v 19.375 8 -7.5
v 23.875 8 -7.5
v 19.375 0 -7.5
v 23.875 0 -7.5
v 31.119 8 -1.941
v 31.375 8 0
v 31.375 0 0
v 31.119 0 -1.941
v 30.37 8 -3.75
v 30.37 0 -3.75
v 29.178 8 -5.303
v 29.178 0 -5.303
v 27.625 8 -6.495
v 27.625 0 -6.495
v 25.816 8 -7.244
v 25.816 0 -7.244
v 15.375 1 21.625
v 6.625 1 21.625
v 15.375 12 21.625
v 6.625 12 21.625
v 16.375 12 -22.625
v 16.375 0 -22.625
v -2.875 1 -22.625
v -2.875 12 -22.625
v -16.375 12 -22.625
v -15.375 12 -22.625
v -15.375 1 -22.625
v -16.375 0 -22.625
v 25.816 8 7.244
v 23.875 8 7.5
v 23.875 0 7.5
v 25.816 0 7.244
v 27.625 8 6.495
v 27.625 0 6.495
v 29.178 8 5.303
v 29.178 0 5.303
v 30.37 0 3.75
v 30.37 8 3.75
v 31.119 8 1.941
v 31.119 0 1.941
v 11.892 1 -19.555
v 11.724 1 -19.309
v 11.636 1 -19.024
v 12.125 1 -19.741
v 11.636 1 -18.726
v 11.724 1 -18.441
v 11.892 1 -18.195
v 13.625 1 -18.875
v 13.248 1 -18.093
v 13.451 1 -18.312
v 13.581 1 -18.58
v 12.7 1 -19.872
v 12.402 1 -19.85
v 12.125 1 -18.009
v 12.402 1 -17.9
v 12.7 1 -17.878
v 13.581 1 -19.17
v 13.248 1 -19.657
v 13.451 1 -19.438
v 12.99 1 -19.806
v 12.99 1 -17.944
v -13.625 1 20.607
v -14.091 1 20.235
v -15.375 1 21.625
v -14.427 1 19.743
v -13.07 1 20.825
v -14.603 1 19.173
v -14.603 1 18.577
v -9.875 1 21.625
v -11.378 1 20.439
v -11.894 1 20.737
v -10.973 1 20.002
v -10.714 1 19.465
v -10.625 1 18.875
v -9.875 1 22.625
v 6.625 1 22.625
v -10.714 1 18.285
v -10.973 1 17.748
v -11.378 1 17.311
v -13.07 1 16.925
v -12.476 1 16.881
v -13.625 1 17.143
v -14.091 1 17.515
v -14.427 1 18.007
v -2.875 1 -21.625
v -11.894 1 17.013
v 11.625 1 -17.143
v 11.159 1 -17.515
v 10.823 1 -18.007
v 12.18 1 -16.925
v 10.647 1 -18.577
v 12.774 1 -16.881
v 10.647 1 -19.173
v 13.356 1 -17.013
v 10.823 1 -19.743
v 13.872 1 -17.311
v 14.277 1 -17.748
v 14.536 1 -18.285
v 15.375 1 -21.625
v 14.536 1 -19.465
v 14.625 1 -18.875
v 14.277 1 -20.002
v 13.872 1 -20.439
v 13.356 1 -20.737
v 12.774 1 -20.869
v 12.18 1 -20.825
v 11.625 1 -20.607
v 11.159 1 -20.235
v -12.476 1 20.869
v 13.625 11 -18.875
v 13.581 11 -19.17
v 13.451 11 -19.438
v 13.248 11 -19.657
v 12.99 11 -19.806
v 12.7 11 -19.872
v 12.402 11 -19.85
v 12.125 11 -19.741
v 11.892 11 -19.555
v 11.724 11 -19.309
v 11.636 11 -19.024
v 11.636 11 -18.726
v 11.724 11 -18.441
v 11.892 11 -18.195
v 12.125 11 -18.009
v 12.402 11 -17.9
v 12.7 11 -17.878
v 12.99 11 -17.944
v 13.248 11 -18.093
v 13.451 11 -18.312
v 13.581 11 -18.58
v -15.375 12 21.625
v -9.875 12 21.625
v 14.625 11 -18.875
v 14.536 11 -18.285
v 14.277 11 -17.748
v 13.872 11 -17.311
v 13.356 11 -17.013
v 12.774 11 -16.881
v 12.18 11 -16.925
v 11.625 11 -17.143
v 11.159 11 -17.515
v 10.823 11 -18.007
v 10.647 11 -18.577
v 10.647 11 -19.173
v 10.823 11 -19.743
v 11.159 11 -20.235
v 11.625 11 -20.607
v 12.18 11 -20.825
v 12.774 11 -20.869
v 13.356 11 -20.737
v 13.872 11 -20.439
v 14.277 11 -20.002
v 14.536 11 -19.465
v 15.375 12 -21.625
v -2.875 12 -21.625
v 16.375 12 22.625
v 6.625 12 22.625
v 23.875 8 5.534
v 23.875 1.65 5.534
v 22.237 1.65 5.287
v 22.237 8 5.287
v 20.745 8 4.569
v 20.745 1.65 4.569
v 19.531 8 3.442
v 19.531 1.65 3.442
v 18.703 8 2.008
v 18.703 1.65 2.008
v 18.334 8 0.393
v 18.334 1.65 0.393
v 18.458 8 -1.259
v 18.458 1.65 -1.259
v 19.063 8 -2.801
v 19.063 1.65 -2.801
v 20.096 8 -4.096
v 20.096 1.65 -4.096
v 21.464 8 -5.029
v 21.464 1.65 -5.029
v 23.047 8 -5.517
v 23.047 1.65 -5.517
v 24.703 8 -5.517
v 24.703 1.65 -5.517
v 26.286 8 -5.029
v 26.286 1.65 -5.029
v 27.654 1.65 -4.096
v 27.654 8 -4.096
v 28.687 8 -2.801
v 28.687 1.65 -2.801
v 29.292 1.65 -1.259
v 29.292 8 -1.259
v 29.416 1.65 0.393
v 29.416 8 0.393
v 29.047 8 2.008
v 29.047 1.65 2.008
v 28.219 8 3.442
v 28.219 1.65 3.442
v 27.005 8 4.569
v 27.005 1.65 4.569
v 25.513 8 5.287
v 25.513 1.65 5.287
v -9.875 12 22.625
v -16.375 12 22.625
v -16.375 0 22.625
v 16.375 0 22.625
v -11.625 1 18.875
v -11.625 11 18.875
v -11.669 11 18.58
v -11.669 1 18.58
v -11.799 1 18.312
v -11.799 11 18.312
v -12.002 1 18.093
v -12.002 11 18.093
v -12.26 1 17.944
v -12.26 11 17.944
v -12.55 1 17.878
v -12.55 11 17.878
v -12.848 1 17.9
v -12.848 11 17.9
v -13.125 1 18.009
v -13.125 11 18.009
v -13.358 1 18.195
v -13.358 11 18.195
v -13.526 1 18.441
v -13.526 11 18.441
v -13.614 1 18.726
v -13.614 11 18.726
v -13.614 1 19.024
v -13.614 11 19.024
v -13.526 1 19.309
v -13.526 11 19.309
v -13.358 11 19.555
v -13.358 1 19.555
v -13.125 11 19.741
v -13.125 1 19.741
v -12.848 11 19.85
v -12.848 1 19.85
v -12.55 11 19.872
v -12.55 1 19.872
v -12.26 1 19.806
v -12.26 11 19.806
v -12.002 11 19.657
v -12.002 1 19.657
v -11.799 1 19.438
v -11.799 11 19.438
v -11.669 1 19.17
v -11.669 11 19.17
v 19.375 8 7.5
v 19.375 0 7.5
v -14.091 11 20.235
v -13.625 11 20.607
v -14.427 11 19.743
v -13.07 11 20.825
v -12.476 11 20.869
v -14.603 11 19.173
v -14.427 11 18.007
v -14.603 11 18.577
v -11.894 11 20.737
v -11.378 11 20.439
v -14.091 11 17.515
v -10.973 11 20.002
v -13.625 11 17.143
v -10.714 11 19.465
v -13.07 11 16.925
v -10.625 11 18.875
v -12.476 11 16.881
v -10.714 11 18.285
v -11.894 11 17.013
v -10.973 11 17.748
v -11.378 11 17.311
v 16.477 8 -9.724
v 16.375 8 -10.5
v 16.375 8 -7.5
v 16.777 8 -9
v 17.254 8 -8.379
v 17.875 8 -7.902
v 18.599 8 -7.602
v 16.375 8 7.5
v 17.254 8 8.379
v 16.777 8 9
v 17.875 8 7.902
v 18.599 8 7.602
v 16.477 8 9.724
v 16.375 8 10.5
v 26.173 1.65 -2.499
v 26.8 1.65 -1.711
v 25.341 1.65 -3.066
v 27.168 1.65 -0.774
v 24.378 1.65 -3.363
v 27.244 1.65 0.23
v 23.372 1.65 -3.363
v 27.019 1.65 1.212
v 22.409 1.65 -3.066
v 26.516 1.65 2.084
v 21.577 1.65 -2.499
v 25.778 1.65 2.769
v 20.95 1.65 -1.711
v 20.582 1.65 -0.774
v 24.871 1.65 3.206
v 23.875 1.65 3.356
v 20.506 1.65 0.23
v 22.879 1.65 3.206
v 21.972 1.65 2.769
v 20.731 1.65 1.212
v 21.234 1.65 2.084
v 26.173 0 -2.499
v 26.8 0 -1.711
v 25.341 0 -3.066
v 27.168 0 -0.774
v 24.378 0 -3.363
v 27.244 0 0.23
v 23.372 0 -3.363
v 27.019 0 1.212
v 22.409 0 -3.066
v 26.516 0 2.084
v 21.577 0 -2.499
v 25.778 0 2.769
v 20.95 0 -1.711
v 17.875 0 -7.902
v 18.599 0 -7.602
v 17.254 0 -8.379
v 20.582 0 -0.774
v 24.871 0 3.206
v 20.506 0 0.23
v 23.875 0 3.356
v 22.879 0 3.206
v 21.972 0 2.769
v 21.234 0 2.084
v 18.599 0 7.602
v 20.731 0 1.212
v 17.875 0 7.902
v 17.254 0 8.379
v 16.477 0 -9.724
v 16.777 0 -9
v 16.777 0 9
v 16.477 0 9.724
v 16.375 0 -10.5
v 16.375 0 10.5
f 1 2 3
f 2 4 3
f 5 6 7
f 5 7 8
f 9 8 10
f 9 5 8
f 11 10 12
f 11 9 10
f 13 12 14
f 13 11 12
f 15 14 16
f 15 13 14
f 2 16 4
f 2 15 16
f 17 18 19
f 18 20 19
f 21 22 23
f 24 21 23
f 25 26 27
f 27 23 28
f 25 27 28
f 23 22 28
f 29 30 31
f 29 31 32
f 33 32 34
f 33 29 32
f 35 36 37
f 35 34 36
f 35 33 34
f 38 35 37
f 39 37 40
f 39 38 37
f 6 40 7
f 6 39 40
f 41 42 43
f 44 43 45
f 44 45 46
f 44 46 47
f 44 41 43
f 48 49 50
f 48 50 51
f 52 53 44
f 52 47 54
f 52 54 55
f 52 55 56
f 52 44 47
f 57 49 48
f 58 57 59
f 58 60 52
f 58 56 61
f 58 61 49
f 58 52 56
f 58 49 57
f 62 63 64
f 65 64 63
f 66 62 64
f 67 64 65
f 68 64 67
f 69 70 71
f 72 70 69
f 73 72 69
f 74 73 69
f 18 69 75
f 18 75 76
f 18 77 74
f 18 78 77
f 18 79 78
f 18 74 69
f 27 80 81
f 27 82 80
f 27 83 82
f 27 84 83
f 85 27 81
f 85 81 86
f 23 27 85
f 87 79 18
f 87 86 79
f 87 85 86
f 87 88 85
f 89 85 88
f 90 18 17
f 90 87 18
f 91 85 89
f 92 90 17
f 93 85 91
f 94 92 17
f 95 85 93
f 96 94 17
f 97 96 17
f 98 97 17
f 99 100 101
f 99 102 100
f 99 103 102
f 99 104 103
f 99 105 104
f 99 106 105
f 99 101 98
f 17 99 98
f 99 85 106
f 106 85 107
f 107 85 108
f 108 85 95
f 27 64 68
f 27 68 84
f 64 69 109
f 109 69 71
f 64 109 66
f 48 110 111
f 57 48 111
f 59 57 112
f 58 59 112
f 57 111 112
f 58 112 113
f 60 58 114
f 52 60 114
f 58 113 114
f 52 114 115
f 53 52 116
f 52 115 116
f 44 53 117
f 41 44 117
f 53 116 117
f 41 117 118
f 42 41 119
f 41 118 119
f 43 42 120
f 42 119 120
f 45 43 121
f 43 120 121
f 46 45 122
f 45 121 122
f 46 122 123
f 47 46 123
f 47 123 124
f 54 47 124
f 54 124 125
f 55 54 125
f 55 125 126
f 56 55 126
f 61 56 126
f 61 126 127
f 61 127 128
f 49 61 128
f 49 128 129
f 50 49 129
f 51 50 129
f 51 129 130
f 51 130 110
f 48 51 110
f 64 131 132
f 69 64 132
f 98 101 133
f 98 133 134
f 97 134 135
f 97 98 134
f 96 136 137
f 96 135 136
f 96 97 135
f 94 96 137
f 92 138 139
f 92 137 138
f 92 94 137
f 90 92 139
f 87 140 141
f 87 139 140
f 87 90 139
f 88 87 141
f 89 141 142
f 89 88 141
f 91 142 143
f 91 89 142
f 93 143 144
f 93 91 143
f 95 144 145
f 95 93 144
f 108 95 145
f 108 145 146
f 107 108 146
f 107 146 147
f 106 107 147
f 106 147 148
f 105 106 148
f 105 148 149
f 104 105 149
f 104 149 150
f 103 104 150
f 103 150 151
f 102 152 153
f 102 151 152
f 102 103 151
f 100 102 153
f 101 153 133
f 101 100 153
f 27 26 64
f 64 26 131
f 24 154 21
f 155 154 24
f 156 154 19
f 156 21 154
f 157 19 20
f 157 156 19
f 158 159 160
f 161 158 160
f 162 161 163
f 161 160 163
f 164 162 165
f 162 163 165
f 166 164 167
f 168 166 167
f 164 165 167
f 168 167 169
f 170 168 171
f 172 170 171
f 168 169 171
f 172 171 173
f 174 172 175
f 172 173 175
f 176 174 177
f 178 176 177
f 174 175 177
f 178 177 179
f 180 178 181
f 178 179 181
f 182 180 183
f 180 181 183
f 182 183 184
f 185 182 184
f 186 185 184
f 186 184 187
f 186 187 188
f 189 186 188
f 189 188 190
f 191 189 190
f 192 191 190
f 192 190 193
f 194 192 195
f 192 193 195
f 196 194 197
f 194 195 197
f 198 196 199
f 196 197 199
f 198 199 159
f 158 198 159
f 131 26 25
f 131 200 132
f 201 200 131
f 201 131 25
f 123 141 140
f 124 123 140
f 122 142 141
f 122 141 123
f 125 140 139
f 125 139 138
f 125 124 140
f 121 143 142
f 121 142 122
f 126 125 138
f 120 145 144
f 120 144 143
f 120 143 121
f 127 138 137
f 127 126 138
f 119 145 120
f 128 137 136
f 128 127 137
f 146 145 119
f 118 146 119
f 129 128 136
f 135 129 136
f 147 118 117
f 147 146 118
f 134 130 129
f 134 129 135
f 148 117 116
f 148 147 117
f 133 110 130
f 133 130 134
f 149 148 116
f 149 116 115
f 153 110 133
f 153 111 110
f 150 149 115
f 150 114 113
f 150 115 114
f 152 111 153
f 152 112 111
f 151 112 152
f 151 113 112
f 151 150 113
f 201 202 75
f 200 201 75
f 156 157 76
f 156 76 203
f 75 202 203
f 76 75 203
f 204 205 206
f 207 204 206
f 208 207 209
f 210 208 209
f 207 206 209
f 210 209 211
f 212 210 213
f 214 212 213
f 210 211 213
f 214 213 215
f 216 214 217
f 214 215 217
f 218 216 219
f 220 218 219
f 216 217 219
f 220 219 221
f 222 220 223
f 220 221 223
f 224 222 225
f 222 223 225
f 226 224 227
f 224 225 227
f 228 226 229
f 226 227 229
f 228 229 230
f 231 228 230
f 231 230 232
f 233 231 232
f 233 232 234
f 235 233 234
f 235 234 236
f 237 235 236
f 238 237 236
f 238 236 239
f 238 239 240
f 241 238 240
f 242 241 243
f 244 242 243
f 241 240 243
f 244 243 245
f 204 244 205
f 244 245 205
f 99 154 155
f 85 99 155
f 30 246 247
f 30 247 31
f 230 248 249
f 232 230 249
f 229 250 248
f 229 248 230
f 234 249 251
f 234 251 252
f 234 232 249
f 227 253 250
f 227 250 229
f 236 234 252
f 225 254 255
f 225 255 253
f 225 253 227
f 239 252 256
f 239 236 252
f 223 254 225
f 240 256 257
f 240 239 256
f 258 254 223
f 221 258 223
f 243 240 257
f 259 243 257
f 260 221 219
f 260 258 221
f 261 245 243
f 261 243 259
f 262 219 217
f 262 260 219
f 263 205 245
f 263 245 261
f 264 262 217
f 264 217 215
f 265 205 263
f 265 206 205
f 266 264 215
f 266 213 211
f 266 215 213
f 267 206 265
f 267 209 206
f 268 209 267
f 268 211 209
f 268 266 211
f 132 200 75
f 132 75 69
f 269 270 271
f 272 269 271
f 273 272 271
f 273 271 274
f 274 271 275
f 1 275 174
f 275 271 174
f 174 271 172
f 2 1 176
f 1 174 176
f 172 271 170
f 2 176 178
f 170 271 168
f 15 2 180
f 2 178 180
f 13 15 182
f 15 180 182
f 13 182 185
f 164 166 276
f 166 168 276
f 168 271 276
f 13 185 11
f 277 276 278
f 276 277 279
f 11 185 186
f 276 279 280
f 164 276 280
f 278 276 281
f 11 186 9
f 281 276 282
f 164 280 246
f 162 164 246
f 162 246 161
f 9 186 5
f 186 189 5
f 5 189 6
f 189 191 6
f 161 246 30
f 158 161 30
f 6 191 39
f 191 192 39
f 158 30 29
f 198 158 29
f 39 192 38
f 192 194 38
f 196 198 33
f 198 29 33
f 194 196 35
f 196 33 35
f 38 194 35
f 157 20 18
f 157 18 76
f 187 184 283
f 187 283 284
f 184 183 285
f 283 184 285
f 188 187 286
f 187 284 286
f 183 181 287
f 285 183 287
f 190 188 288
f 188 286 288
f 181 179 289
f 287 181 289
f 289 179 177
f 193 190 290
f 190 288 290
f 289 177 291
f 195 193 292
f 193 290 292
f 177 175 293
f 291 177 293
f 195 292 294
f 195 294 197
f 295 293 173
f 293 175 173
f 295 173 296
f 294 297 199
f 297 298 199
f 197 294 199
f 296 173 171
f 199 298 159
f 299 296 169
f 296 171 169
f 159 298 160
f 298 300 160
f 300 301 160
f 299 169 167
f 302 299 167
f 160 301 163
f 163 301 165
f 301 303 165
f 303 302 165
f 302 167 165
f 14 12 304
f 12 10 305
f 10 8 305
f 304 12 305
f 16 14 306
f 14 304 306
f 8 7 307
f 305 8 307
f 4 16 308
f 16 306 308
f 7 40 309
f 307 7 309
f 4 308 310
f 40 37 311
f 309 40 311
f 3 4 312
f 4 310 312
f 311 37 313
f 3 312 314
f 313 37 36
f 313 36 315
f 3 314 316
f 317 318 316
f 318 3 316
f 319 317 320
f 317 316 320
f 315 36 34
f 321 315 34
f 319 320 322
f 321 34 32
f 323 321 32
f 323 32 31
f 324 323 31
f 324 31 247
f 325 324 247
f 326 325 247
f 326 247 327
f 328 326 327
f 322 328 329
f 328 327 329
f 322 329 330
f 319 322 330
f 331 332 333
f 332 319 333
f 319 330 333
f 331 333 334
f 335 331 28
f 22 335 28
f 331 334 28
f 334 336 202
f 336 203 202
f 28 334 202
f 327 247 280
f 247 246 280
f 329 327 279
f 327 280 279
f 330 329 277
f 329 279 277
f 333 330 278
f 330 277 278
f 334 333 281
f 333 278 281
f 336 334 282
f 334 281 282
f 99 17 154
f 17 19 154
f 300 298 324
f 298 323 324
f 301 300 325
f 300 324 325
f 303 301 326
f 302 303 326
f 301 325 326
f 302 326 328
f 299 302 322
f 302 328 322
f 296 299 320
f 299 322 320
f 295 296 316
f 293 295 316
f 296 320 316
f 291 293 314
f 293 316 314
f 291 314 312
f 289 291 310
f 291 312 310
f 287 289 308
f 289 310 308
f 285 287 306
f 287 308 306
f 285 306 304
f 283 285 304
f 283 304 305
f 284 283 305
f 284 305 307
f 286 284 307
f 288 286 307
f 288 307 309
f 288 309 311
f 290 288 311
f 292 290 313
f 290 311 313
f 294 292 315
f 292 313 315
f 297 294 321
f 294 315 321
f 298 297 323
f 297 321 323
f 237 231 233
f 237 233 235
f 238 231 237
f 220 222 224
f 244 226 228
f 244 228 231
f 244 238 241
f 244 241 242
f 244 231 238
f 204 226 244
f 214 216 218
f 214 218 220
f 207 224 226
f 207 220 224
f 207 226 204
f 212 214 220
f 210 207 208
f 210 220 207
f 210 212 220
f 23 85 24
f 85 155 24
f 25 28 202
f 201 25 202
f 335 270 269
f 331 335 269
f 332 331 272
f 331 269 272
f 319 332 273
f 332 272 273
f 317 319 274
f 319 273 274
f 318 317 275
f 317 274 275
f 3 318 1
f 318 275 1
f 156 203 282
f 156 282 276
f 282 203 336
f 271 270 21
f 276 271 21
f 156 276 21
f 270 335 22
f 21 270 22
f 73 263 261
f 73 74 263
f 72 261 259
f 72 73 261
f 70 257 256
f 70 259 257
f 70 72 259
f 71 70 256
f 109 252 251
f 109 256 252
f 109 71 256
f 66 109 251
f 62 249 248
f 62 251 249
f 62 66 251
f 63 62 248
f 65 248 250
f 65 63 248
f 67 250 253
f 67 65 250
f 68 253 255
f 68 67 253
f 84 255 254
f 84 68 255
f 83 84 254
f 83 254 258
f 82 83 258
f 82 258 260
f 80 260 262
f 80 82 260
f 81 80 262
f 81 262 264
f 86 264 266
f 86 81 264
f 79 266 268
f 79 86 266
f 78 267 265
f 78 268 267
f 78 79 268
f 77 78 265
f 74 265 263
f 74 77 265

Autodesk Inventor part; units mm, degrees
ref_plane "YZ Plane" through (0, 0, 0) normal (1, 0, 0) x (0, 1, 0)
ref_plane "XZ Plane" through (0, 0, 0) normal (0, 1, 0) x (-1, 0, 0)
ref_plane "XY Plane" through (0, 0, 0) normal (0, 0, 1) x (1, 0, 0)
sketch "Sketch1" plane through (0, 0, 0) normal (0, 1, 0) x (-1, 0, 0)
  line L0 (16.375, 22.625) -> (-16.375, 22.625)
  line L1 (-16.375, 22.625) -> (-16.375, -22.625)
  line L2 (-16.375, -22.625) -> (16.375, -22.625)
  line L3 (16.375, -22.625) -> (16.375, 22.625)
  line L4 (16.375, 22.625) -> (-16.375, -22.625) construction
  line L5 (-16.375, 22.625) -> (16.375, -22.625) construction
  point P0 (0, 0)
  dimension "d0" = 32.75
  dimension "d1" = 45.25
extrude "Extrusion1" add sketch "Sketch1" along normal blind 12
sketch "Sketch2" plane through (0, 12, 0) normal (0, 1, 0) x (1, 0, 0)
  line L0 (-15.375, -21.625) -> (15.375, -21.625)
  line L1 (15.375, -21.625) -> (15.375, 21.625)
  line L2 (15.375, 21.625) -> (-15.375, 21.625)
  line L3 (-15.375, 21.625) -> (-15.375, -21.625)
  line L4 (-15.375, -21.625) -> (15.375, 21.625) construction
  line L5 (15.375, -21.625) -> (-15.375, 21.625) construction
  point P0 (0, 0)
  dimension "d4" = 30.75
  dimension "d5" = 43.25
extrude "Extrusion2" cut sketch "Sketch2" against normal blind 11
sketch "Sketch5" plane through (0, 1, 0) normal (0, 1, 0) x (1, 0, 0)
  circle A0 centre (12.625, 18.875) radius 2
  circle A1 centre (-12.625, -18.875) radius 2
  line L0 (15.375, 21.625) -> (15.375, -21.625) projected
  line L1 (-15.375, 21.625) -> (15.375, 21.625) projected
  line L2 (-15.375, -21.625) -> (-15.375, 21.625) projected
  line L3 (15.375, -21.625) -> (-15.375, -21.625) projected
  point P0 (0, 0)
  dimension "d20" = 4
  dimension "d21" = 2.75
  dimension "d22" = 2.75
  dimension "d23" = 2.75
  dimension "d24" = 2.75
  dimension "d25" = 4
extrude "Extrusion5" add sketch "Sketch5" along normal blind 10 contours A0 | A1
sketch "Sketch6" plane through (12.625, 11, -18.875) normal (0, 1, 0) x (1, 0, 0)
  circle A0 centre (-25.25, -37.75) radius 2 projected
  circle A1 centre (-25.25, -37.75) radius 1
  circle A2 centre (0, 0) radius 2 projected
  circle A3 centre (0, 0) radius 1
  point P0 (-12.625, -18.875)
  dimension "d28" = 2
  dimension "d29" = 2
extrude "Extrusion6" cut sketch "Sketch6" against normal blind 10 contours A1 | A3
sketch "Sketch7" plane through (0, 12, 0) normal (0, 1, 0) x (1, 0, 0)
  line L0 (16.375, 22.625) -> (-16.375, 22.625) projected
  line L1 (-15.375, 21.625) -> (-2.875, 21.625)
  line L2 (-2.875, 21.625) -> (-2.875, 22.625)
  line L3 (-2.875, 22.625) -> (-15.375, 22.625)
  line L4 (-15.375, 22.625) -> (-15.375, 21.625)
  line L5 (15.375, -21.625) -> (-15.375, -21.625) projected
  line L6 (-16.375, -22.625) -> (16.375, -22.625) projected
  line L7 (-9.875, -21.625) -> (6.625, -21.625)
  line L8 (6.625, -21.625) -> (6.625, -22.625)
  line L9 (6.625, -22.625) -> (-9.875, -22.625)
  line L10 (-9.875, -22.625) -> (-9.875, -21.625)
  line L11 (-15.375, -21.625) -> (-15.375, 21.625) projected
  point P0 (0, 0)
  dimension "d32" = 12.5
  dimension "d33" = 5.5
  dimension "d35" = 22
extrude "Extrusion7" cut sketch "Sketch7" against normal blind 11
sketch "Sketch8" plane through (0, 0, 0) normal (0, -1, 0) x (1, 0, 0)
  line L0 (16.375, 22.625) -> (16.375, -22.625) projected
  line L1 (16.375, 7.5) -> (31.375, 7.5)
  line L2 (31.375, 7.5) -> (31.375, -7.5)
  line L3 (31.375, -7.5) -> (16.375, -7.5)
  line L4 (16.375, -7.5) -> (16.375, 7.5)
  point P0 (0, 0)
  dimension "d38" = 15
  dimension "d39" = 7.5
  dimension "d40" = 15
extrude "Extrusion8" add sketch "Sketch8" against normal blind 8
sketch "Sketch9" plane through (0, 8, 0) normal (0, 1, 0) x (1, 0, 0)
  line L0 (31.375, -7.5) -> (31.375, 7.5) projected
  point P0 (0, 0)
  point P1 (23.875, 0.0223)
  dimension "d50" = 7.5
hole "Hole1" at (23.875, 8, -0.0223) direction (0, -1, 0) diameter 6.756 depth 10.9728 tip angle 118 counterbore diameter 11.113 counterbore depth 6.35 clearance for "Socket Head Cap Screw" size "1/4" standard "Ansi Unified Screw Threads"
fillet "Fillet1" radius 3 2 edges at (16.375, 4, -7.5) (16.375, 4, 7.5)
fillet "Fillet2" radius 7.5 2 edges at (31.375, 4, -7.5) (31.375, 4, 7.5)
properties part number "ResonanceBoardEnc"
